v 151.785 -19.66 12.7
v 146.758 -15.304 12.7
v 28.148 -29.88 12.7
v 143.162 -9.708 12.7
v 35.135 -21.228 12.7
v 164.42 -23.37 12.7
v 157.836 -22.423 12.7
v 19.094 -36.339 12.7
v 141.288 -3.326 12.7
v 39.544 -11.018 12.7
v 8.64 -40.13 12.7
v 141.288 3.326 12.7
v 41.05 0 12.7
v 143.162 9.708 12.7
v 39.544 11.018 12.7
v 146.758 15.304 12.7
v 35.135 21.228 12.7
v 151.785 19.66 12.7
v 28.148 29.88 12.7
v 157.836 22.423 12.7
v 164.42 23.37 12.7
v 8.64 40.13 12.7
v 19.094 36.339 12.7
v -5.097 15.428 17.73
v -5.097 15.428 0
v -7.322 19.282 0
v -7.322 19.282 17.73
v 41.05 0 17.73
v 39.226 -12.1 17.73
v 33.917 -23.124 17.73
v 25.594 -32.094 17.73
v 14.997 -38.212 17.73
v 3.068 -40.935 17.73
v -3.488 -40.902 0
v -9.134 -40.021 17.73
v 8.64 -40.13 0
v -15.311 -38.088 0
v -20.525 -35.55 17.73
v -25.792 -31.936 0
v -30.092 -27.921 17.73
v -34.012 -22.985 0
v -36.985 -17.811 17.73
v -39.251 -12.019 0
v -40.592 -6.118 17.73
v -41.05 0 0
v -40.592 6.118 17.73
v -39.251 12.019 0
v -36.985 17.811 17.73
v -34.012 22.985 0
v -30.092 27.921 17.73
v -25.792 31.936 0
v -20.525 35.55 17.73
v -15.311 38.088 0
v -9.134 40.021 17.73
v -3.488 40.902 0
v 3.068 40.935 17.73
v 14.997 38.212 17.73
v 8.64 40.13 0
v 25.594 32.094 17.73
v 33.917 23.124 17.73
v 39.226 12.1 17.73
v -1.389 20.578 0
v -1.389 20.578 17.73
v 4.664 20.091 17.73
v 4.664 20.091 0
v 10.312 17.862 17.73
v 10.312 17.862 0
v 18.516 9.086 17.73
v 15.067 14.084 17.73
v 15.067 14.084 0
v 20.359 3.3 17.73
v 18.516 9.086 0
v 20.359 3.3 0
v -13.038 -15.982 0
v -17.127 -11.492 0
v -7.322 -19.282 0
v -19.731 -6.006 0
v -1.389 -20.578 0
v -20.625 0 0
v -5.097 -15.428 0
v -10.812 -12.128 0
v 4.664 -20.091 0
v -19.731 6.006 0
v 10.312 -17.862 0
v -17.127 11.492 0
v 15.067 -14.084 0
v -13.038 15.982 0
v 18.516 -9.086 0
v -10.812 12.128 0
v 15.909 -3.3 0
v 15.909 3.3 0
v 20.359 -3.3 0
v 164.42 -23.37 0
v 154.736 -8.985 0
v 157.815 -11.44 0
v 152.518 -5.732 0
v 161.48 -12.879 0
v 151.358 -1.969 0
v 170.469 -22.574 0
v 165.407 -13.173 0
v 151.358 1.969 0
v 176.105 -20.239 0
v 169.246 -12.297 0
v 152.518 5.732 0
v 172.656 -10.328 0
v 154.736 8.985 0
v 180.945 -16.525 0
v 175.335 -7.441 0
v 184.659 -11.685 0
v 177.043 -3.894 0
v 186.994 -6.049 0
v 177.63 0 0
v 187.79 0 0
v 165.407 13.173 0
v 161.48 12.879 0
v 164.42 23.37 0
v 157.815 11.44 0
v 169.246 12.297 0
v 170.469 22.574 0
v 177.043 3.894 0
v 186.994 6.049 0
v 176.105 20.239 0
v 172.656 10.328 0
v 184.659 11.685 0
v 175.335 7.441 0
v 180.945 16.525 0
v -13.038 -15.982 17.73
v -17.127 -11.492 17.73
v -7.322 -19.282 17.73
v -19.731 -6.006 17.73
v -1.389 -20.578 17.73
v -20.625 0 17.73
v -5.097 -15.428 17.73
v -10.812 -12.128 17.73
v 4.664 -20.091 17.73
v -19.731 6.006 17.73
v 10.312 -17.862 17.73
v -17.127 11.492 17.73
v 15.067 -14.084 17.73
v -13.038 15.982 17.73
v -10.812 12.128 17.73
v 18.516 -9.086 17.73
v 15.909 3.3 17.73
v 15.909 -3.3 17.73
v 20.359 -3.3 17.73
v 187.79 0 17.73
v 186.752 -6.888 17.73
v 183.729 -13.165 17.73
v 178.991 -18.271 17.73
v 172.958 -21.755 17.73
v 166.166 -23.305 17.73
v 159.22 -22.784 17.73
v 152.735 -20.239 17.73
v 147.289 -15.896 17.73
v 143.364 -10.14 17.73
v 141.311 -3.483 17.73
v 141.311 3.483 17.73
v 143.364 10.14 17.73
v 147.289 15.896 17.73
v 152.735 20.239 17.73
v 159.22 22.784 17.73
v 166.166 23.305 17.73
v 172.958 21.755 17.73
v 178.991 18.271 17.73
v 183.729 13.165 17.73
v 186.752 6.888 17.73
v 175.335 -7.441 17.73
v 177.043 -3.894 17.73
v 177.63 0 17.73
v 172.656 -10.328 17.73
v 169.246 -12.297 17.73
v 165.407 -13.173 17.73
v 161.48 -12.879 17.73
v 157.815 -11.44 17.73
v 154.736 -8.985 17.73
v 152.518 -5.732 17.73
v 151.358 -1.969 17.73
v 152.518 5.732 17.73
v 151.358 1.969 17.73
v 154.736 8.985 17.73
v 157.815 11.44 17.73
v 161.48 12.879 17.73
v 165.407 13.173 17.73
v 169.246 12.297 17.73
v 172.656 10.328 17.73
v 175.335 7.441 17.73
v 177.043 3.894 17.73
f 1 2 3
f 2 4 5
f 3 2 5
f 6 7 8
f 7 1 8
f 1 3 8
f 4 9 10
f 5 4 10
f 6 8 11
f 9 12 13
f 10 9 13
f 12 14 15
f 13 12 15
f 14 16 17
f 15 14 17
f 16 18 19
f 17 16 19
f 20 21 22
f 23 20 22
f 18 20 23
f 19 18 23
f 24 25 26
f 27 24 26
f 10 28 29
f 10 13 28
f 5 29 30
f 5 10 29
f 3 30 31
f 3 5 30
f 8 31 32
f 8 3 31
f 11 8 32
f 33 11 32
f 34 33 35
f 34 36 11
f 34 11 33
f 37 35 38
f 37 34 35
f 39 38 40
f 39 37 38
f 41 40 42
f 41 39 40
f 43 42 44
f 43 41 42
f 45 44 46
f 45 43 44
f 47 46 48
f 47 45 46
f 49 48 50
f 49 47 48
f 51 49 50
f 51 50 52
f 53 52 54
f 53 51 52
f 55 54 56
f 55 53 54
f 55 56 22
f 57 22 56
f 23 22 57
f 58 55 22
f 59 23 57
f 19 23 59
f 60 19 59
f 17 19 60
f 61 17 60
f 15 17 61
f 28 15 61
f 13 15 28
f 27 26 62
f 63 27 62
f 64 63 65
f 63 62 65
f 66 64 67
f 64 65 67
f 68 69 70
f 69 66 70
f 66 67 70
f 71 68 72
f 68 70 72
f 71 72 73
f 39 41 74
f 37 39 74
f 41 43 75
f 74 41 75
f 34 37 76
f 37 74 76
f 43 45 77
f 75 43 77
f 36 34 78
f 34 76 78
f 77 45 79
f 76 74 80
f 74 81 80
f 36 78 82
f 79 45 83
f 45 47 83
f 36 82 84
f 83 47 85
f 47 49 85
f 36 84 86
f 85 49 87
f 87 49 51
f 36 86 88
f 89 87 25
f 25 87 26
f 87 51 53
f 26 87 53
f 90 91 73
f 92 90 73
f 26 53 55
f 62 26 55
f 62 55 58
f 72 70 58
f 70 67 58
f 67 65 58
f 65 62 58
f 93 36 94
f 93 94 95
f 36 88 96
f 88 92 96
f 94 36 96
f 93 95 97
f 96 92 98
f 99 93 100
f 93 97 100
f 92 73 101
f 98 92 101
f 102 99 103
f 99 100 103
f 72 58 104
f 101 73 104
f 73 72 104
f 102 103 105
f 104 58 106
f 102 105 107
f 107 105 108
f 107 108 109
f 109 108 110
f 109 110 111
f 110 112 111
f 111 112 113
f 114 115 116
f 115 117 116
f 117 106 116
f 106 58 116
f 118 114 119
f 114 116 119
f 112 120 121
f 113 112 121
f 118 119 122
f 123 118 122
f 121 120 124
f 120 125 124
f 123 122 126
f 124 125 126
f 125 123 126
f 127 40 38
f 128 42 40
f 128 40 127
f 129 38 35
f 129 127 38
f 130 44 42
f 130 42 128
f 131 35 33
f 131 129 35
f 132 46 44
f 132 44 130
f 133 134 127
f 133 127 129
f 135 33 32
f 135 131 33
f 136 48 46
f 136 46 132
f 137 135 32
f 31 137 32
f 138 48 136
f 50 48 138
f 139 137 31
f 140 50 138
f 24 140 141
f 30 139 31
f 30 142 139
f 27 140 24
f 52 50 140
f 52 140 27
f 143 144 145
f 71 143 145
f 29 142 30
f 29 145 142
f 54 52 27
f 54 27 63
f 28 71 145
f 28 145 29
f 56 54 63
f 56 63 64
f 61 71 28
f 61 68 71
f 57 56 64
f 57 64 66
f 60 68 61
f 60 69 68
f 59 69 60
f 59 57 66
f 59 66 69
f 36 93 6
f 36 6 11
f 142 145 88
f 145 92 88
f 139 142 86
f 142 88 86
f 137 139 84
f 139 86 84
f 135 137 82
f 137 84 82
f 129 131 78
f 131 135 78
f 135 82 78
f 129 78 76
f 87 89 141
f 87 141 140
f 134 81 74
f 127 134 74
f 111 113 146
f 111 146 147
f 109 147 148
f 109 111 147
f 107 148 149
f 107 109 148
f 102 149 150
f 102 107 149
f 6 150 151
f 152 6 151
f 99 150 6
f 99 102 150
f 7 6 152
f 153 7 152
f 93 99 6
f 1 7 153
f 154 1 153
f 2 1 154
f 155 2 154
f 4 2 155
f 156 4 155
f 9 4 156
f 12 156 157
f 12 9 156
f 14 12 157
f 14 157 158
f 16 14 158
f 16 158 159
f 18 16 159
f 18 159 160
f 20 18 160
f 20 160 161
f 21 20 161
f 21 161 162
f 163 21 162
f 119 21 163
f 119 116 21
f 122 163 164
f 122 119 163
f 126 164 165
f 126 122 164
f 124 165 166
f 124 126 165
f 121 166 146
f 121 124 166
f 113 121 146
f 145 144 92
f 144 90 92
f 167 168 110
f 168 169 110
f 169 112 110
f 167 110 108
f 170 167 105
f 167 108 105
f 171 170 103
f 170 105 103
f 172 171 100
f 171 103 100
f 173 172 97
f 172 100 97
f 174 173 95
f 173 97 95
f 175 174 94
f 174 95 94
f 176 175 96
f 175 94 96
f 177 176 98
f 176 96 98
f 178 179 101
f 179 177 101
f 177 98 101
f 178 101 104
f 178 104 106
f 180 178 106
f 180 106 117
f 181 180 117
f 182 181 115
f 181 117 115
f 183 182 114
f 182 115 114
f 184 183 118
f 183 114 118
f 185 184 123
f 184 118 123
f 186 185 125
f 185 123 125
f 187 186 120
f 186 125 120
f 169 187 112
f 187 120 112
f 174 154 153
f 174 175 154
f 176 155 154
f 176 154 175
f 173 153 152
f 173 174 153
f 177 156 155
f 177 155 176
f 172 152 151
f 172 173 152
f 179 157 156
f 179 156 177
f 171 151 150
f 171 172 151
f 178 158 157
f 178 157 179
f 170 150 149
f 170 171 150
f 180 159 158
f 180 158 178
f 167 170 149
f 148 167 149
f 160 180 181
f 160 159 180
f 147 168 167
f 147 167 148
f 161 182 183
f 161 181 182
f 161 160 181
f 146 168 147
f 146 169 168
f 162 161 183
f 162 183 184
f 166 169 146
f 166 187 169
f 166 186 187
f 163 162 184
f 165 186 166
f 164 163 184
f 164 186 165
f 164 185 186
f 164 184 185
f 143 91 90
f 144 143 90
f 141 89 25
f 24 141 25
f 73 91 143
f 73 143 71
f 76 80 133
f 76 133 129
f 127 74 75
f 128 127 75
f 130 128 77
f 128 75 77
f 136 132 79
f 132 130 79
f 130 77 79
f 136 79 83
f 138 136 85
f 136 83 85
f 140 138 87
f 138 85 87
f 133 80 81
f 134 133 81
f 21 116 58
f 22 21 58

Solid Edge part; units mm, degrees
sketch "Sketch1" plane through (0, 0, 0) normal (0, 0, 1) x (1, 0, 0)
  circle A0 centre (0, 0) radius 41.05
  circle A1 centre (0, 0) radius 20.625
  circle A2 centre (164.42, 0) radius 23.37
  circle A3 centre (164.42, 0) radius 13.21
extrude "Protrusion1" add sketch "Sketch1" along normal blind 17.73
sketch "Sketch2" plane through (0, 0, 0) normal (0, 0, 1) x (1, 0, 0)
  line L0 (164.42, -23.37) -> (8.6399, -40.1305)
  line L1 (31.0664, 0) -> (8.6399, -40.1305)
  line L2 (8.6399, 40.1305) -> (31.0664, 0)
  line L3 (164.42, 23.37) -> (8.6399, 40.1305)
  line L4 (143.9301, 0) -> (164.42, 23.37)
  line L5 (164.42, -23.37) -> (143.9301, 0)
extrude "ExtrudedProtrusion_2" add sketch "Sketch2" along normal blind 12.7
sketch "Sketch3" plane through (0, 0, 0) normal (0, 0, 1) x (1, 0, 0)
  line L0 (-5.0968, -15.4278) -> (-7.5968, -19.758)
  line L1 (-13.3125, -16.458) -> (-7.5968, -19.758)
  line L2 (-10.8125, -12.1278) -> (-13.3125, -16.458)
  line L3 (-5.0968, -15.4278) -> (-10.8125, -12.1278)
  line L4 (-10.8125, 12.1278) -> (-5.0968, 15.4278)
  line L5 (-5.0968, 15.4278) -> (-7.5968, 19.758)
  line L6 (-7.5968, 19.758) -> (-13.3125, 16.458)
  line L7 (-10.8125, 12.1278) -> (-13.3125, 16.458)
  line L8 (15.9093, -3.3) -> (20.9093, -3.3)
  line L9 (20.9093, -3.3) -> (20.9093, 3.3)
  line L10 (15.9093, 3.3) -> (20.9093, 3.3)
  line L11 (15.9093, 3.3) -> (15.9093, -3.3)
extrude "Protrusion2" add sketch "Sketch3" along normal up to vertex (17.73 mm away)
